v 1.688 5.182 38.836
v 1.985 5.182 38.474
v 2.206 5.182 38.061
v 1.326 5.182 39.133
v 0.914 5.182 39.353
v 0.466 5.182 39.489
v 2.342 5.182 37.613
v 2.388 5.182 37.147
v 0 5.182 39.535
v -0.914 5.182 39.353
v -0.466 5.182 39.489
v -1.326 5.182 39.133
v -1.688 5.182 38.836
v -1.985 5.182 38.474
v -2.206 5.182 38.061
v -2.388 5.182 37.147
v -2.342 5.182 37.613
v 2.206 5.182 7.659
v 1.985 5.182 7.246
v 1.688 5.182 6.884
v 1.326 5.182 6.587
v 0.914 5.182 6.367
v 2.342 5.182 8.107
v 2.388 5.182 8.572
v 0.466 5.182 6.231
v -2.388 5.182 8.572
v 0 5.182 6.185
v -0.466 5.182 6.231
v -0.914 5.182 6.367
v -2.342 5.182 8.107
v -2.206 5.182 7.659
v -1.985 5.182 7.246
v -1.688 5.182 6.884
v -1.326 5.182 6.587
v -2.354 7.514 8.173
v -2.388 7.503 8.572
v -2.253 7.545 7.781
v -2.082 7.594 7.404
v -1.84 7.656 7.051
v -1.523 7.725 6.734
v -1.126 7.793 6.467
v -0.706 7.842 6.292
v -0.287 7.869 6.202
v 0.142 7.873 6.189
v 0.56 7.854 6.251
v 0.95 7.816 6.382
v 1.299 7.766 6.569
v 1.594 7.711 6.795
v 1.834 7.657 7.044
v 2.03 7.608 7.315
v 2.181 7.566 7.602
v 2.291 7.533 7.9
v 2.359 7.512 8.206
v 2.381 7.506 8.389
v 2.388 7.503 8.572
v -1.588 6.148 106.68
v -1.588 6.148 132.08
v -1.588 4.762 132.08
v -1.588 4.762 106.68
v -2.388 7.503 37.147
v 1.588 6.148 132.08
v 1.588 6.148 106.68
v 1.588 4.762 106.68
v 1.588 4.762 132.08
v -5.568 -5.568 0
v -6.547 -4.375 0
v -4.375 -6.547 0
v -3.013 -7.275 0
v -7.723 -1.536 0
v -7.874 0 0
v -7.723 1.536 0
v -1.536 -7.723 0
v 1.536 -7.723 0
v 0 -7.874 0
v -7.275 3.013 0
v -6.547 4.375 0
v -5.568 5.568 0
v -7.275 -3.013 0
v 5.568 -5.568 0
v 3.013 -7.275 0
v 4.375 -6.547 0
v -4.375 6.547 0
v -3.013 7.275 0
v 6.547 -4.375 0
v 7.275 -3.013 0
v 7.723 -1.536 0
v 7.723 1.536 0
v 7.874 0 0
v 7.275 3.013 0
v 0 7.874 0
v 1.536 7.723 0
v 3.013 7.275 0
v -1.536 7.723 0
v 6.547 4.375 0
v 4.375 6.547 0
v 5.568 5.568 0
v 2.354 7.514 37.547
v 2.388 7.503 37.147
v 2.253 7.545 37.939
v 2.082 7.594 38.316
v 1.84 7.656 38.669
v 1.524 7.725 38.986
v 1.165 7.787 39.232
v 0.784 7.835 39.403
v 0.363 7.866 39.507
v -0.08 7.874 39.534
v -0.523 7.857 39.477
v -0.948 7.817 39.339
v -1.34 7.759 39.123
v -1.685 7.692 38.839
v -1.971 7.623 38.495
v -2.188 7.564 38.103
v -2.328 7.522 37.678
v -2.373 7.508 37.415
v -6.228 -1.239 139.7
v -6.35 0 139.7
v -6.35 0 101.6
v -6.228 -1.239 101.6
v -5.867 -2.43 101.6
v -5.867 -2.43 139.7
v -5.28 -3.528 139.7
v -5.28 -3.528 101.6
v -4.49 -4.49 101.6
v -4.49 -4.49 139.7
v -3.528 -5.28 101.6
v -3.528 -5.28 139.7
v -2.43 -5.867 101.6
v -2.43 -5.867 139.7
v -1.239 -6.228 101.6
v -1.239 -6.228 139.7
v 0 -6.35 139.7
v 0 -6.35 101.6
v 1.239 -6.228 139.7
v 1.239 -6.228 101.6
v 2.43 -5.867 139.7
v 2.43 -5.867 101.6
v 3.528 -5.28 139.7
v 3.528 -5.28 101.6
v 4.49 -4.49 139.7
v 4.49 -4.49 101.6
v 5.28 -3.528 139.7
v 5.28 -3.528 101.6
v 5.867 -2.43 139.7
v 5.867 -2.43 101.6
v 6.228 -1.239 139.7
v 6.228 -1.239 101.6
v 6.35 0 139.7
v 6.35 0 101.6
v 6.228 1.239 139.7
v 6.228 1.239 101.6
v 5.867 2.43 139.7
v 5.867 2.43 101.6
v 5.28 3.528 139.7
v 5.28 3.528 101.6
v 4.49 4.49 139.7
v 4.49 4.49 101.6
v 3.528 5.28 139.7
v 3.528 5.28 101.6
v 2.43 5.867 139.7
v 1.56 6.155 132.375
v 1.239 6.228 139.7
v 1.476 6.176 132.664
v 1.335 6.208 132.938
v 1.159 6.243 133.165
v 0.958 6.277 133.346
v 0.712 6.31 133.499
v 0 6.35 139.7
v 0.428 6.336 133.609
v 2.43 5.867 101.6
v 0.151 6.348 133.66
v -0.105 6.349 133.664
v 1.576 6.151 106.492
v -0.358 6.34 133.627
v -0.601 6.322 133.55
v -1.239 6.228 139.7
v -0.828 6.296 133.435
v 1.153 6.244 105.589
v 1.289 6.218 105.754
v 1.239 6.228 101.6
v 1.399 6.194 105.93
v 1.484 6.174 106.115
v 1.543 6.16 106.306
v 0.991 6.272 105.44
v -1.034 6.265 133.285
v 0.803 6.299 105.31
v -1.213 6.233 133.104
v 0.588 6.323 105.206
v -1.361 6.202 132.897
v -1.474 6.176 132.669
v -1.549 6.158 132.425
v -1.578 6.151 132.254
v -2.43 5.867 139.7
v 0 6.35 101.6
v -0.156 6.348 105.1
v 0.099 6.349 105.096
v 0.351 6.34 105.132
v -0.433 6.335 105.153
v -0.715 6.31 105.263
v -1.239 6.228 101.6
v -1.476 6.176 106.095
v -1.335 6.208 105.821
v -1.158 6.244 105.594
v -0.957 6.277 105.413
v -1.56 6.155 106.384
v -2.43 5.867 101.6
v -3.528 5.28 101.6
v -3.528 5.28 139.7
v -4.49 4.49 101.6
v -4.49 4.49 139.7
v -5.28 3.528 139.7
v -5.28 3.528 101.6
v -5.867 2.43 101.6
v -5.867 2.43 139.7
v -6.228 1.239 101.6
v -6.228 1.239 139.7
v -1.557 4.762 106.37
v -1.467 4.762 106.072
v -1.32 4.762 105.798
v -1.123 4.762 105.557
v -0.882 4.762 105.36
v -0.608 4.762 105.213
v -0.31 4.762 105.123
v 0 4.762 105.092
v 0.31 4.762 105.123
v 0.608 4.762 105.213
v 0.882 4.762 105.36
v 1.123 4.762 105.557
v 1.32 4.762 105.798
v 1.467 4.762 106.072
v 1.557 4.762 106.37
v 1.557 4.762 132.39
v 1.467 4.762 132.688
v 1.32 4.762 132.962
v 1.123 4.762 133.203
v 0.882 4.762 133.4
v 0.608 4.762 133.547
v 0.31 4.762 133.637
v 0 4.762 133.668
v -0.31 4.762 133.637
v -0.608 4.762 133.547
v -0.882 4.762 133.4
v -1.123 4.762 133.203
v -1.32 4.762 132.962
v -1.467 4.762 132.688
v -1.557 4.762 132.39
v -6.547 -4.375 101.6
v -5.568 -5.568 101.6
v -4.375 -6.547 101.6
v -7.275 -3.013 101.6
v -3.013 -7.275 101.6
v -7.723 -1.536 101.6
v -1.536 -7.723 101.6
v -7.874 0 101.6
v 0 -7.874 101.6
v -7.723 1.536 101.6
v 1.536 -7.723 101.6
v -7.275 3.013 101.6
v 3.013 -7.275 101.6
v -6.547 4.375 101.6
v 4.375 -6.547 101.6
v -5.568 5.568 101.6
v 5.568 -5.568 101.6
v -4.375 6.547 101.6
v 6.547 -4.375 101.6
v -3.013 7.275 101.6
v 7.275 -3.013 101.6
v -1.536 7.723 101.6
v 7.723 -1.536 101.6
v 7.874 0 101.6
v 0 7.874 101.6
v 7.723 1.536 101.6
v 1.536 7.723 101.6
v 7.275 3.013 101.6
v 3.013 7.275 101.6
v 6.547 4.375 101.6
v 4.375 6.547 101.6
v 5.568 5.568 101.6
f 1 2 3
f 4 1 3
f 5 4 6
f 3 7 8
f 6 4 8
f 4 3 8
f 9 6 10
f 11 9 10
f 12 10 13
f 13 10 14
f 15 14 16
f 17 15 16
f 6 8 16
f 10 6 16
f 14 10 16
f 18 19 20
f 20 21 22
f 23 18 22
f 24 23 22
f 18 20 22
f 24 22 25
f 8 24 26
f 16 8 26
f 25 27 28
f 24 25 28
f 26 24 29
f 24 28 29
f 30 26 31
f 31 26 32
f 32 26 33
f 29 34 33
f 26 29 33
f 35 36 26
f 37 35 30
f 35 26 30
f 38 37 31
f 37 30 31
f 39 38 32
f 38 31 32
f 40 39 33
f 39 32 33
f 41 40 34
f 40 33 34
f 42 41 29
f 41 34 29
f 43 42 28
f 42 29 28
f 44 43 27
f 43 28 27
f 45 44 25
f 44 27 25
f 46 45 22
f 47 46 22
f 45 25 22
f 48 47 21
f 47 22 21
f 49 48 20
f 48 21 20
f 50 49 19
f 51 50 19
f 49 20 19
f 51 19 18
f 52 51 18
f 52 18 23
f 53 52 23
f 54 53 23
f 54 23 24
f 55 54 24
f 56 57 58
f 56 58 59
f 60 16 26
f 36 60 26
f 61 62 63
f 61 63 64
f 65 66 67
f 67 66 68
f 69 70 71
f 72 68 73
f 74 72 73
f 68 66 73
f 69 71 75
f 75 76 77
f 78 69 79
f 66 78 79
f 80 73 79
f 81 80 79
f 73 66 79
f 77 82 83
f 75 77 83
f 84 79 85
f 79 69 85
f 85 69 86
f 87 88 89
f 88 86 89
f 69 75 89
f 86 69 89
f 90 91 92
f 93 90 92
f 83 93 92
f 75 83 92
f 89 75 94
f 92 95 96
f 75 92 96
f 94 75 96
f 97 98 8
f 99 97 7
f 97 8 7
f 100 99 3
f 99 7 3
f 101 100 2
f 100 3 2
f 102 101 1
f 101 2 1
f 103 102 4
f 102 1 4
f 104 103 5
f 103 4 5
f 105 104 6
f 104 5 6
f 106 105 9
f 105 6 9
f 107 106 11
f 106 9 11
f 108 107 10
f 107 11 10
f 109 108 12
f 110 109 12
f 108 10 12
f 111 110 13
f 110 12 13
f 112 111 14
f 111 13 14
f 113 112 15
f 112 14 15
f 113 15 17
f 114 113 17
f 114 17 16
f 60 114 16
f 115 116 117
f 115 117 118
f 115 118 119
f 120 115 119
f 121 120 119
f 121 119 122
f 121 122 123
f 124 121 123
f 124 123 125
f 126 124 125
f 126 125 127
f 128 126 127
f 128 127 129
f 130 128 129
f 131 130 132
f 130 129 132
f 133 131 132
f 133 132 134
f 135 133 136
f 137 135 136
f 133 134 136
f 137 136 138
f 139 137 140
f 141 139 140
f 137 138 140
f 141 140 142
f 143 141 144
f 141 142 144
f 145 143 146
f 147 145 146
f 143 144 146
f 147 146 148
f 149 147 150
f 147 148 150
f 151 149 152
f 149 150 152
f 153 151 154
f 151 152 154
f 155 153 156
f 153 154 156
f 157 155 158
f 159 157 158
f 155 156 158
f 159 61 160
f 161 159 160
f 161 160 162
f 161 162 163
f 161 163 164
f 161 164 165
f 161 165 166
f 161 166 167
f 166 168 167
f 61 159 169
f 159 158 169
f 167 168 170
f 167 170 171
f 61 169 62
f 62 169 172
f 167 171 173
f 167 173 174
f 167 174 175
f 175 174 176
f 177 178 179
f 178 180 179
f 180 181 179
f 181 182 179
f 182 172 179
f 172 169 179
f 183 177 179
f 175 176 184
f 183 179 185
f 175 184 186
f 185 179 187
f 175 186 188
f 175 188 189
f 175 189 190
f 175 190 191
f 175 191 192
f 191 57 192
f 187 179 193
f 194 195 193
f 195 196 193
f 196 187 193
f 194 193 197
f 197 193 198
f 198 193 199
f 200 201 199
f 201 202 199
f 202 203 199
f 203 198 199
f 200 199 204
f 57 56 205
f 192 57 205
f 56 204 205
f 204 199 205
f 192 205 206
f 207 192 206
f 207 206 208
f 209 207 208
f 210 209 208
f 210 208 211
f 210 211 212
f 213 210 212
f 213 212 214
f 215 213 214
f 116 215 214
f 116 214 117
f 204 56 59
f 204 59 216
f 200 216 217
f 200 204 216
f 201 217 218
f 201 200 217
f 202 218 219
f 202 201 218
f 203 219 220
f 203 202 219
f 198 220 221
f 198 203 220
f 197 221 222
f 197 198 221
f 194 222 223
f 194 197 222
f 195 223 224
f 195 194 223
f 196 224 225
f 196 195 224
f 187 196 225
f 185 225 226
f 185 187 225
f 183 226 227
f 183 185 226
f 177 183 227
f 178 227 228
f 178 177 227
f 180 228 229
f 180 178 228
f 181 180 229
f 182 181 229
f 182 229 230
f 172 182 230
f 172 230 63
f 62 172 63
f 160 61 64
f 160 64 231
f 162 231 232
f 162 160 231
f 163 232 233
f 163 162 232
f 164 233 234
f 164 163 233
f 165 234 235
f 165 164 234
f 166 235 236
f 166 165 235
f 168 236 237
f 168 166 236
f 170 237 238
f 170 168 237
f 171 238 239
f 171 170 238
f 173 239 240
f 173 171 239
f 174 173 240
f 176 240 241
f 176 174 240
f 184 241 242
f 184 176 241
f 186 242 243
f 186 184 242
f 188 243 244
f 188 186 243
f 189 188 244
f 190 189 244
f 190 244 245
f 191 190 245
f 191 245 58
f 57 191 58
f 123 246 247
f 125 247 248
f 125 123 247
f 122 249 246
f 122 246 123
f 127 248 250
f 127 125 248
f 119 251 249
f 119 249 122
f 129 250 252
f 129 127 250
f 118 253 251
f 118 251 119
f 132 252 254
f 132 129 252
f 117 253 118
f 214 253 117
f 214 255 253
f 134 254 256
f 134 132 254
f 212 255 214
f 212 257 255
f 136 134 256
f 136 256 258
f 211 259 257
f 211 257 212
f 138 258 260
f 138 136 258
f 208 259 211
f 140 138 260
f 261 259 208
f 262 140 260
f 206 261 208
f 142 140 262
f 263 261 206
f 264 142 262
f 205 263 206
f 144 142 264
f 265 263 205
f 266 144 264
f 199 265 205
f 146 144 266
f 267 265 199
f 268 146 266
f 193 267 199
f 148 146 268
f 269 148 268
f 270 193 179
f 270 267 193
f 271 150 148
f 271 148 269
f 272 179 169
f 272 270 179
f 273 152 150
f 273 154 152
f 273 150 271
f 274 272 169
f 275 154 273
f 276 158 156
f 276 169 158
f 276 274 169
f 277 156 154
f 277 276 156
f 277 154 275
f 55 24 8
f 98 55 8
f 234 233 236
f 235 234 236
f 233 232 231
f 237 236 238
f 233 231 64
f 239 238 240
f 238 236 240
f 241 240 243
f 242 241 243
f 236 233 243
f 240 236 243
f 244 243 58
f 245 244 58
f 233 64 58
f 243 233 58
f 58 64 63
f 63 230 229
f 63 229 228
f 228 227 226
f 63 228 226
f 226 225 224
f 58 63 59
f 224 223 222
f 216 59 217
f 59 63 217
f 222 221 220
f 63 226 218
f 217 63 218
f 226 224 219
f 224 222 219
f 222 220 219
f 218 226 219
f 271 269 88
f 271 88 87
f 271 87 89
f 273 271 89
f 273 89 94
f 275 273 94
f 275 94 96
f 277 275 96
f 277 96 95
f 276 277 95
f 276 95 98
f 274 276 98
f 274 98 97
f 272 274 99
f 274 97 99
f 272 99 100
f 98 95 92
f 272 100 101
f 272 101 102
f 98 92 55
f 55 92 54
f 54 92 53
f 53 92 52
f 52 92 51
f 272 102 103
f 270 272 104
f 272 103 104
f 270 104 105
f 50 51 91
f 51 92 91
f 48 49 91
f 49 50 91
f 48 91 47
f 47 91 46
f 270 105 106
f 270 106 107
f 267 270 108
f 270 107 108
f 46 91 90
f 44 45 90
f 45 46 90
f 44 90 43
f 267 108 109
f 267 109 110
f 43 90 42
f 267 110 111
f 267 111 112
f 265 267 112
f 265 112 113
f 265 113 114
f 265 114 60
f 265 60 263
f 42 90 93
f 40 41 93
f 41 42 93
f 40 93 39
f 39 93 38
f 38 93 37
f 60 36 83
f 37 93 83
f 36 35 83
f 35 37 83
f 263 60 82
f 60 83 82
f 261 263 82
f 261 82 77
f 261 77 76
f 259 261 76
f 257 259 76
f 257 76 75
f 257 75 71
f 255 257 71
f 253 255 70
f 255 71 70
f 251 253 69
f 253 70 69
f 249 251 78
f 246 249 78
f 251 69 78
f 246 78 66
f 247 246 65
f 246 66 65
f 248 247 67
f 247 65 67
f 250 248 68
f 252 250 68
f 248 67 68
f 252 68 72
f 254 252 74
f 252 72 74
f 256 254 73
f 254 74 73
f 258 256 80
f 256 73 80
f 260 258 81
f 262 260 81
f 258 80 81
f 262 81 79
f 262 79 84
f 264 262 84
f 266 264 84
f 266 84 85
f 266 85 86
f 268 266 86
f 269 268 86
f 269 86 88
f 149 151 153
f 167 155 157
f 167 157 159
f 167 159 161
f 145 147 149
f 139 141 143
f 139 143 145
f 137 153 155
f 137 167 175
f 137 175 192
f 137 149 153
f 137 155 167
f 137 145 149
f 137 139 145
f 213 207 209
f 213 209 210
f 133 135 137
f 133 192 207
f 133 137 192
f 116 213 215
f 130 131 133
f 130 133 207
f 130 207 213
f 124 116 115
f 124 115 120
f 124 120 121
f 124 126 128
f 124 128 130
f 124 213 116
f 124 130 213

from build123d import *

# Parameters (mm, degrees)
SKETCH1_R               = 7.874
BOSS_EXTRUDE1_DEPTH     = 101.6
SKETCH2_R               = 6.35
BOSS_EXTRUDE2_DEPTH     = 38.1
CUT_EXTRUDE3_DEPTH      = 1.5875
CUT_EXTRUDE5_DEPTH      = 1.524
CUT_EXTRUDE5_DEPTH_BACK = 1.1684


with BuildPart() as part:
    # Sketch1 → Boss-Extrude1 (new body)
    with BuildSketch(Plane.XY):
        Circle(SKETCH1_R)
    extrude(amount=BOSS_EXTRUDE1_DEPTH)

    # Sketch2 → Boss-Extrude2 (add)
    with BuildSketch(Plane.XY.offset(101.6)):
        with Locations(Location((0, 0, 0), (0, 0, 180))):
            Circle(SKETCH2_R)
    extrude(amount=BOSS_EXTRUDE2_DEPTH)

    # Sketch6 → Cut-Extrude3 (cut)
    with BuildSketch(Plane(origin=(0, 6.35, 139.7), x_dir=(1, 0, 0), z_dir=(0, 1, 0))):
        with BuildLine():
            Line((1.5875, 33.02), (1.5875, 7.62))
            ThreePointArc((1.5875, 7.62), (0, 6.0325), (-1.5875, 7.62))
            Line((-1.5875, 7.62), (-1.5875, 33.02))
            ThreePointArc((-1.5875, 33.02), (0, 34.6075), (1.5875, 33.02))
        make_face()
    extrude(amount=-CUT_EXTRUDE3_DEPTH, mode=Mode.SUBTRACT)

    # Sketch7 → Cut-Extrude5 (cut, two sides: drawn at the far end of the back side and taken through both)
    with BuildSketch(Plane(origin=(0, 6.35, 139.7), x_dir=(1, 0, 0), z_dir=(0, 1, 0)).offset(-CUT_EXTRUDE5_DEPTH_BACK)):
        with BuildLine():
            Line((2.3876, 131.1275), (2.3876, 102.5525))
            ThreePointArc((2.3876, 102.5525), (0, 100.1649), (-2.3876, 102.5525))
            Line((-2.3876, 102.5525), (-2.3876, 131.1275))
            ThreePointArc((-2.3876, 131.1275), (0, 133.5151), (2.3876, 131.1275))
        make_face()
    extrude(amount=CUT_EXTRUDE5_DEPTH + CUT_EXTRUDE5_DEPTH_BACK, mode=Mode.SUBTRACT)


solid = part.part
